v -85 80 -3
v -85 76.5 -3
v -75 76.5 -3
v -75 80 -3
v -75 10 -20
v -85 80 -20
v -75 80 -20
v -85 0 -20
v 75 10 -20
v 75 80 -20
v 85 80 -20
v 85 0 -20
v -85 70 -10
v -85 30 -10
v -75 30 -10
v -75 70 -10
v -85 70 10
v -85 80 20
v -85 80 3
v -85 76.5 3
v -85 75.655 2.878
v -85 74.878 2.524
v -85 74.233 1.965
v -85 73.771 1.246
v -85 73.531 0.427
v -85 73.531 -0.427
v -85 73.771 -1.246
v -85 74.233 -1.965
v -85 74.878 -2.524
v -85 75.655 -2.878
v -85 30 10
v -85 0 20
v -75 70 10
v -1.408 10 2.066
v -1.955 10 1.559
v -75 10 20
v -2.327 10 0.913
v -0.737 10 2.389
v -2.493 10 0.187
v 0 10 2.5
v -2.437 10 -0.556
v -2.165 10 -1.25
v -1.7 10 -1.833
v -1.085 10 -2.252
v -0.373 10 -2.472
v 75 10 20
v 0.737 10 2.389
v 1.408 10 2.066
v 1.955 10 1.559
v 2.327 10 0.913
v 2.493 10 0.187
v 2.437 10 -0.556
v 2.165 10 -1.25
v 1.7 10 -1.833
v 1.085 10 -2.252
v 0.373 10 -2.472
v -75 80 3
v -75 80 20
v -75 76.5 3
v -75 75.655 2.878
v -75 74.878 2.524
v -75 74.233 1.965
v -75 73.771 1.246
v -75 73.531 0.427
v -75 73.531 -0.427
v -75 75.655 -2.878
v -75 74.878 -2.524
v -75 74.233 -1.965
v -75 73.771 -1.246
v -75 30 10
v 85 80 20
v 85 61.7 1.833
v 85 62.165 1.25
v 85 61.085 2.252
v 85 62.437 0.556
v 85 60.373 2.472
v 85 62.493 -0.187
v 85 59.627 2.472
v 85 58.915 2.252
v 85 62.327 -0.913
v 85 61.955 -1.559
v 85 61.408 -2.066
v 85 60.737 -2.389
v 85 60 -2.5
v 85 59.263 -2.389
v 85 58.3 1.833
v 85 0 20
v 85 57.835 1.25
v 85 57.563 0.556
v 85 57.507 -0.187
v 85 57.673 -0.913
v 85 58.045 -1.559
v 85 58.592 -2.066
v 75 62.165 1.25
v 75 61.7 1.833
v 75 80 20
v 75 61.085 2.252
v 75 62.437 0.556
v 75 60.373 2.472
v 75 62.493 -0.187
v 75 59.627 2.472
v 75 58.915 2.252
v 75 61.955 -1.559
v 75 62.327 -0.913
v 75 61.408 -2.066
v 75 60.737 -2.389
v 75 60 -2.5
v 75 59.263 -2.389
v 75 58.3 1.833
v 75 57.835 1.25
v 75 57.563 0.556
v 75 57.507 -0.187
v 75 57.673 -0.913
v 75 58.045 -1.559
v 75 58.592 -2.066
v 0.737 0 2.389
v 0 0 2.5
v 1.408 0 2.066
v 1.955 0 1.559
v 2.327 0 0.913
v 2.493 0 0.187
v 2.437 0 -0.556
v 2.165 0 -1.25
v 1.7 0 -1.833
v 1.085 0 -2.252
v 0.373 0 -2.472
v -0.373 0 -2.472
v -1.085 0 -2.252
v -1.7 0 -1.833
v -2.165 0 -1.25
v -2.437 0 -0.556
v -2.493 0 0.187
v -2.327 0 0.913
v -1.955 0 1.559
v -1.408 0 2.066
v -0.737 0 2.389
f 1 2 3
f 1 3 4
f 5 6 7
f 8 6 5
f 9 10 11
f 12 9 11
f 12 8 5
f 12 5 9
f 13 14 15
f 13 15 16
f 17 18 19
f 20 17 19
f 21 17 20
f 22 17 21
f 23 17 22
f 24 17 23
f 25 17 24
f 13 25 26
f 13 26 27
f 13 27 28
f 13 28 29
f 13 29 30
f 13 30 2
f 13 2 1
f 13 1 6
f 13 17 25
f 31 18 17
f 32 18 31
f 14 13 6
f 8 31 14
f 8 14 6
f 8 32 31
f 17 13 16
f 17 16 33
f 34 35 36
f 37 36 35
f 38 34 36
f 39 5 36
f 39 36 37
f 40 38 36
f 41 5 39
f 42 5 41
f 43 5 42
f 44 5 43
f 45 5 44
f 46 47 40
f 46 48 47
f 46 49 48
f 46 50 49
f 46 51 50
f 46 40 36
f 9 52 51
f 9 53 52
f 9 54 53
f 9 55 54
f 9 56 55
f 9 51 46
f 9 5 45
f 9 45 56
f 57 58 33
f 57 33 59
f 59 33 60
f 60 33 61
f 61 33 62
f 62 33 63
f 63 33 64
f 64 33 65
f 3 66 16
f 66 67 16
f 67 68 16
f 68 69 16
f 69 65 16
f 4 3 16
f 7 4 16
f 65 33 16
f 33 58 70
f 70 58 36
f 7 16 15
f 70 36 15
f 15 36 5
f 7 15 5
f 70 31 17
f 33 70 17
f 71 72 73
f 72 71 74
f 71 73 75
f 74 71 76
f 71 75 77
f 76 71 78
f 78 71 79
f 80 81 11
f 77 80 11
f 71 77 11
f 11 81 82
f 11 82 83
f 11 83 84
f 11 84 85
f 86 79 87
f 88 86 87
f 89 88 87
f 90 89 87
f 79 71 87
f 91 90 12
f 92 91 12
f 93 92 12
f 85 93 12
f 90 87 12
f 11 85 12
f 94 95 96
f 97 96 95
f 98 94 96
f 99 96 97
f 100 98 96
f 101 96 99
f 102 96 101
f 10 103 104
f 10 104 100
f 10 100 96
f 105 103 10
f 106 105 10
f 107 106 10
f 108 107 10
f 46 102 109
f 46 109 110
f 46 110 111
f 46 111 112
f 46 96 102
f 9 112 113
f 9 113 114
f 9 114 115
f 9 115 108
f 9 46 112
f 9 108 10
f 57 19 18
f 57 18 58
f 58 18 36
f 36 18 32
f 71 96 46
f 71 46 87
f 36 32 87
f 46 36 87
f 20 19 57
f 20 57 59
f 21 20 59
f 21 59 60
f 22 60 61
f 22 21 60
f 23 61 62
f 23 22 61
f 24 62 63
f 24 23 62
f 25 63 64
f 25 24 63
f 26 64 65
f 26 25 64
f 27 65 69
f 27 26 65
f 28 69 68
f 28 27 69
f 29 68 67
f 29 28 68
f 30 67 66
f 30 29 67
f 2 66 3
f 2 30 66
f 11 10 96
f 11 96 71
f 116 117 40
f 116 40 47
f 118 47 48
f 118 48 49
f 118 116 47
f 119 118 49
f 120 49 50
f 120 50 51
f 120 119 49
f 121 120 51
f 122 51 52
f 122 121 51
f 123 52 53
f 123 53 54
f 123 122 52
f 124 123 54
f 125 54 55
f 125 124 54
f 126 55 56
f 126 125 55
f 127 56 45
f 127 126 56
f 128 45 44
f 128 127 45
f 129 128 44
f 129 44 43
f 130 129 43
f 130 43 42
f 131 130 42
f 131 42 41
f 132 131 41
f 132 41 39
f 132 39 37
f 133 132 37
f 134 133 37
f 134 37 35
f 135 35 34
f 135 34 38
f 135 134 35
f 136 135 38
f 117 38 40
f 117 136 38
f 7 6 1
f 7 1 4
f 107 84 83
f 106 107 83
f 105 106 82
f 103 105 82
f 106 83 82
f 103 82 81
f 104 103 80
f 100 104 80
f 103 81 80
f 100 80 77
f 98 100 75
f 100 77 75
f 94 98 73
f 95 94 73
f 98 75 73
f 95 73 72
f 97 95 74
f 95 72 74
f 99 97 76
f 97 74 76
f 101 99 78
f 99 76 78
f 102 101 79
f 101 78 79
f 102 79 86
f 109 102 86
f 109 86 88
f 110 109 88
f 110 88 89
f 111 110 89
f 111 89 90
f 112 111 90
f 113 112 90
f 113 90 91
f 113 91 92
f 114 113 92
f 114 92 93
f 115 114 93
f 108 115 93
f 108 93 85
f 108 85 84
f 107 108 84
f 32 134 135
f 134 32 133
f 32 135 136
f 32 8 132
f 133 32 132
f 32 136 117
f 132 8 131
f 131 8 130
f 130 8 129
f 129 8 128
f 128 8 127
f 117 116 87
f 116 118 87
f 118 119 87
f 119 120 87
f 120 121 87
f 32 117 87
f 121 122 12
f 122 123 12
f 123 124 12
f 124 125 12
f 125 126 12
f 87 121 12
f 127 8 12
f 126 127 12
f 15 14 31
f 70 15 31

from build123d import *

# Parameters (mm, degrees)
SKETCH1_W           = 170
SKETCH1_H           = 40
SKETCH1_R           = 2.5
BOSS_EXTRUDE1_DEPTH = 10
SKETCH2_W           = 10
SKETCH2_H           = 40
BOSS_EXTRUDE2_DEPTH = 70
SKETCH3_W           = 20
SKETCH3_H           = 40
CUT_EXTRUDE1_DEPTH  = 50
SKETCH4_R           = 2.5
CUT_EXTRUDE2_DEPTH  = 24


with BuildPart() as part:
    # Sketch1 → Boss-Extrude1 (new body)
    with BuildSketch(Plane(origin=(0, 0, 0), x_dir=(1, 0, 0), z_dir=(0, 1, 0))):
        Rectangle(SKETCH1_W, SKETCH1_H)
        with Locations(Location((0, 0, 0), (0, 0, 270))):
            Circle(SKETCH1_R, mode=Mode.SUBTRACT)
    extrude(amount=BOSS_EXTRUDE1_DEPTH)

    # Sketch2 → Boss-Extrude2 (add)
    with BuildSketch(Plane(origin=(0, 10, 0), x_dir=(1, 0, 0), z_dir=(0, 1, 0))):
        with Locations((80, 0)):
            Rectangle(SKETCH2_W, SKETCH2_H)
        with Locations((-80, 0)):
            Rectangle(SKETCH2_W, SKETCH2_H)
    extrude(amount=BOSS_EXTRUDE2_DEPTH)

    # Sketch3 → Cut-Extrude1 (cut)
    with BuildSketch(Plane.ZY.offset(85)):
        with Locations((0, 50)):
            Rectangle(SKETCH3_W, SKETCH3_H)
        with BuildLine():
            Line((3, 80), (3, 76.5))
            ThreePointArc((3, 76.5), (0, 73.5), (-3, 76.5))
            Line((-3, 76.5), (-3, 80))
            ThreePointArc((-3, 80), (0, 83), (3, 80))
        make_face()
    extrude(amount=-CUT_EXTRUDE1_DEPTH, mode=Mode.SUBTRACT)

    # Sketch4 → Cut-Extrude2 (cut)
    with BuildSketch(Plane(origin=(85, 0, 0), x_dir=(0, 0, -1), z_dir=(1, 0, 0))):
        with Locations((0, 60)):
            Circle(SKETCH4_R)
    extrude(amount=-CUT_EXTRUDE2_DEPTH, mode=Mode.SUBTRACT)


solid = part.part
